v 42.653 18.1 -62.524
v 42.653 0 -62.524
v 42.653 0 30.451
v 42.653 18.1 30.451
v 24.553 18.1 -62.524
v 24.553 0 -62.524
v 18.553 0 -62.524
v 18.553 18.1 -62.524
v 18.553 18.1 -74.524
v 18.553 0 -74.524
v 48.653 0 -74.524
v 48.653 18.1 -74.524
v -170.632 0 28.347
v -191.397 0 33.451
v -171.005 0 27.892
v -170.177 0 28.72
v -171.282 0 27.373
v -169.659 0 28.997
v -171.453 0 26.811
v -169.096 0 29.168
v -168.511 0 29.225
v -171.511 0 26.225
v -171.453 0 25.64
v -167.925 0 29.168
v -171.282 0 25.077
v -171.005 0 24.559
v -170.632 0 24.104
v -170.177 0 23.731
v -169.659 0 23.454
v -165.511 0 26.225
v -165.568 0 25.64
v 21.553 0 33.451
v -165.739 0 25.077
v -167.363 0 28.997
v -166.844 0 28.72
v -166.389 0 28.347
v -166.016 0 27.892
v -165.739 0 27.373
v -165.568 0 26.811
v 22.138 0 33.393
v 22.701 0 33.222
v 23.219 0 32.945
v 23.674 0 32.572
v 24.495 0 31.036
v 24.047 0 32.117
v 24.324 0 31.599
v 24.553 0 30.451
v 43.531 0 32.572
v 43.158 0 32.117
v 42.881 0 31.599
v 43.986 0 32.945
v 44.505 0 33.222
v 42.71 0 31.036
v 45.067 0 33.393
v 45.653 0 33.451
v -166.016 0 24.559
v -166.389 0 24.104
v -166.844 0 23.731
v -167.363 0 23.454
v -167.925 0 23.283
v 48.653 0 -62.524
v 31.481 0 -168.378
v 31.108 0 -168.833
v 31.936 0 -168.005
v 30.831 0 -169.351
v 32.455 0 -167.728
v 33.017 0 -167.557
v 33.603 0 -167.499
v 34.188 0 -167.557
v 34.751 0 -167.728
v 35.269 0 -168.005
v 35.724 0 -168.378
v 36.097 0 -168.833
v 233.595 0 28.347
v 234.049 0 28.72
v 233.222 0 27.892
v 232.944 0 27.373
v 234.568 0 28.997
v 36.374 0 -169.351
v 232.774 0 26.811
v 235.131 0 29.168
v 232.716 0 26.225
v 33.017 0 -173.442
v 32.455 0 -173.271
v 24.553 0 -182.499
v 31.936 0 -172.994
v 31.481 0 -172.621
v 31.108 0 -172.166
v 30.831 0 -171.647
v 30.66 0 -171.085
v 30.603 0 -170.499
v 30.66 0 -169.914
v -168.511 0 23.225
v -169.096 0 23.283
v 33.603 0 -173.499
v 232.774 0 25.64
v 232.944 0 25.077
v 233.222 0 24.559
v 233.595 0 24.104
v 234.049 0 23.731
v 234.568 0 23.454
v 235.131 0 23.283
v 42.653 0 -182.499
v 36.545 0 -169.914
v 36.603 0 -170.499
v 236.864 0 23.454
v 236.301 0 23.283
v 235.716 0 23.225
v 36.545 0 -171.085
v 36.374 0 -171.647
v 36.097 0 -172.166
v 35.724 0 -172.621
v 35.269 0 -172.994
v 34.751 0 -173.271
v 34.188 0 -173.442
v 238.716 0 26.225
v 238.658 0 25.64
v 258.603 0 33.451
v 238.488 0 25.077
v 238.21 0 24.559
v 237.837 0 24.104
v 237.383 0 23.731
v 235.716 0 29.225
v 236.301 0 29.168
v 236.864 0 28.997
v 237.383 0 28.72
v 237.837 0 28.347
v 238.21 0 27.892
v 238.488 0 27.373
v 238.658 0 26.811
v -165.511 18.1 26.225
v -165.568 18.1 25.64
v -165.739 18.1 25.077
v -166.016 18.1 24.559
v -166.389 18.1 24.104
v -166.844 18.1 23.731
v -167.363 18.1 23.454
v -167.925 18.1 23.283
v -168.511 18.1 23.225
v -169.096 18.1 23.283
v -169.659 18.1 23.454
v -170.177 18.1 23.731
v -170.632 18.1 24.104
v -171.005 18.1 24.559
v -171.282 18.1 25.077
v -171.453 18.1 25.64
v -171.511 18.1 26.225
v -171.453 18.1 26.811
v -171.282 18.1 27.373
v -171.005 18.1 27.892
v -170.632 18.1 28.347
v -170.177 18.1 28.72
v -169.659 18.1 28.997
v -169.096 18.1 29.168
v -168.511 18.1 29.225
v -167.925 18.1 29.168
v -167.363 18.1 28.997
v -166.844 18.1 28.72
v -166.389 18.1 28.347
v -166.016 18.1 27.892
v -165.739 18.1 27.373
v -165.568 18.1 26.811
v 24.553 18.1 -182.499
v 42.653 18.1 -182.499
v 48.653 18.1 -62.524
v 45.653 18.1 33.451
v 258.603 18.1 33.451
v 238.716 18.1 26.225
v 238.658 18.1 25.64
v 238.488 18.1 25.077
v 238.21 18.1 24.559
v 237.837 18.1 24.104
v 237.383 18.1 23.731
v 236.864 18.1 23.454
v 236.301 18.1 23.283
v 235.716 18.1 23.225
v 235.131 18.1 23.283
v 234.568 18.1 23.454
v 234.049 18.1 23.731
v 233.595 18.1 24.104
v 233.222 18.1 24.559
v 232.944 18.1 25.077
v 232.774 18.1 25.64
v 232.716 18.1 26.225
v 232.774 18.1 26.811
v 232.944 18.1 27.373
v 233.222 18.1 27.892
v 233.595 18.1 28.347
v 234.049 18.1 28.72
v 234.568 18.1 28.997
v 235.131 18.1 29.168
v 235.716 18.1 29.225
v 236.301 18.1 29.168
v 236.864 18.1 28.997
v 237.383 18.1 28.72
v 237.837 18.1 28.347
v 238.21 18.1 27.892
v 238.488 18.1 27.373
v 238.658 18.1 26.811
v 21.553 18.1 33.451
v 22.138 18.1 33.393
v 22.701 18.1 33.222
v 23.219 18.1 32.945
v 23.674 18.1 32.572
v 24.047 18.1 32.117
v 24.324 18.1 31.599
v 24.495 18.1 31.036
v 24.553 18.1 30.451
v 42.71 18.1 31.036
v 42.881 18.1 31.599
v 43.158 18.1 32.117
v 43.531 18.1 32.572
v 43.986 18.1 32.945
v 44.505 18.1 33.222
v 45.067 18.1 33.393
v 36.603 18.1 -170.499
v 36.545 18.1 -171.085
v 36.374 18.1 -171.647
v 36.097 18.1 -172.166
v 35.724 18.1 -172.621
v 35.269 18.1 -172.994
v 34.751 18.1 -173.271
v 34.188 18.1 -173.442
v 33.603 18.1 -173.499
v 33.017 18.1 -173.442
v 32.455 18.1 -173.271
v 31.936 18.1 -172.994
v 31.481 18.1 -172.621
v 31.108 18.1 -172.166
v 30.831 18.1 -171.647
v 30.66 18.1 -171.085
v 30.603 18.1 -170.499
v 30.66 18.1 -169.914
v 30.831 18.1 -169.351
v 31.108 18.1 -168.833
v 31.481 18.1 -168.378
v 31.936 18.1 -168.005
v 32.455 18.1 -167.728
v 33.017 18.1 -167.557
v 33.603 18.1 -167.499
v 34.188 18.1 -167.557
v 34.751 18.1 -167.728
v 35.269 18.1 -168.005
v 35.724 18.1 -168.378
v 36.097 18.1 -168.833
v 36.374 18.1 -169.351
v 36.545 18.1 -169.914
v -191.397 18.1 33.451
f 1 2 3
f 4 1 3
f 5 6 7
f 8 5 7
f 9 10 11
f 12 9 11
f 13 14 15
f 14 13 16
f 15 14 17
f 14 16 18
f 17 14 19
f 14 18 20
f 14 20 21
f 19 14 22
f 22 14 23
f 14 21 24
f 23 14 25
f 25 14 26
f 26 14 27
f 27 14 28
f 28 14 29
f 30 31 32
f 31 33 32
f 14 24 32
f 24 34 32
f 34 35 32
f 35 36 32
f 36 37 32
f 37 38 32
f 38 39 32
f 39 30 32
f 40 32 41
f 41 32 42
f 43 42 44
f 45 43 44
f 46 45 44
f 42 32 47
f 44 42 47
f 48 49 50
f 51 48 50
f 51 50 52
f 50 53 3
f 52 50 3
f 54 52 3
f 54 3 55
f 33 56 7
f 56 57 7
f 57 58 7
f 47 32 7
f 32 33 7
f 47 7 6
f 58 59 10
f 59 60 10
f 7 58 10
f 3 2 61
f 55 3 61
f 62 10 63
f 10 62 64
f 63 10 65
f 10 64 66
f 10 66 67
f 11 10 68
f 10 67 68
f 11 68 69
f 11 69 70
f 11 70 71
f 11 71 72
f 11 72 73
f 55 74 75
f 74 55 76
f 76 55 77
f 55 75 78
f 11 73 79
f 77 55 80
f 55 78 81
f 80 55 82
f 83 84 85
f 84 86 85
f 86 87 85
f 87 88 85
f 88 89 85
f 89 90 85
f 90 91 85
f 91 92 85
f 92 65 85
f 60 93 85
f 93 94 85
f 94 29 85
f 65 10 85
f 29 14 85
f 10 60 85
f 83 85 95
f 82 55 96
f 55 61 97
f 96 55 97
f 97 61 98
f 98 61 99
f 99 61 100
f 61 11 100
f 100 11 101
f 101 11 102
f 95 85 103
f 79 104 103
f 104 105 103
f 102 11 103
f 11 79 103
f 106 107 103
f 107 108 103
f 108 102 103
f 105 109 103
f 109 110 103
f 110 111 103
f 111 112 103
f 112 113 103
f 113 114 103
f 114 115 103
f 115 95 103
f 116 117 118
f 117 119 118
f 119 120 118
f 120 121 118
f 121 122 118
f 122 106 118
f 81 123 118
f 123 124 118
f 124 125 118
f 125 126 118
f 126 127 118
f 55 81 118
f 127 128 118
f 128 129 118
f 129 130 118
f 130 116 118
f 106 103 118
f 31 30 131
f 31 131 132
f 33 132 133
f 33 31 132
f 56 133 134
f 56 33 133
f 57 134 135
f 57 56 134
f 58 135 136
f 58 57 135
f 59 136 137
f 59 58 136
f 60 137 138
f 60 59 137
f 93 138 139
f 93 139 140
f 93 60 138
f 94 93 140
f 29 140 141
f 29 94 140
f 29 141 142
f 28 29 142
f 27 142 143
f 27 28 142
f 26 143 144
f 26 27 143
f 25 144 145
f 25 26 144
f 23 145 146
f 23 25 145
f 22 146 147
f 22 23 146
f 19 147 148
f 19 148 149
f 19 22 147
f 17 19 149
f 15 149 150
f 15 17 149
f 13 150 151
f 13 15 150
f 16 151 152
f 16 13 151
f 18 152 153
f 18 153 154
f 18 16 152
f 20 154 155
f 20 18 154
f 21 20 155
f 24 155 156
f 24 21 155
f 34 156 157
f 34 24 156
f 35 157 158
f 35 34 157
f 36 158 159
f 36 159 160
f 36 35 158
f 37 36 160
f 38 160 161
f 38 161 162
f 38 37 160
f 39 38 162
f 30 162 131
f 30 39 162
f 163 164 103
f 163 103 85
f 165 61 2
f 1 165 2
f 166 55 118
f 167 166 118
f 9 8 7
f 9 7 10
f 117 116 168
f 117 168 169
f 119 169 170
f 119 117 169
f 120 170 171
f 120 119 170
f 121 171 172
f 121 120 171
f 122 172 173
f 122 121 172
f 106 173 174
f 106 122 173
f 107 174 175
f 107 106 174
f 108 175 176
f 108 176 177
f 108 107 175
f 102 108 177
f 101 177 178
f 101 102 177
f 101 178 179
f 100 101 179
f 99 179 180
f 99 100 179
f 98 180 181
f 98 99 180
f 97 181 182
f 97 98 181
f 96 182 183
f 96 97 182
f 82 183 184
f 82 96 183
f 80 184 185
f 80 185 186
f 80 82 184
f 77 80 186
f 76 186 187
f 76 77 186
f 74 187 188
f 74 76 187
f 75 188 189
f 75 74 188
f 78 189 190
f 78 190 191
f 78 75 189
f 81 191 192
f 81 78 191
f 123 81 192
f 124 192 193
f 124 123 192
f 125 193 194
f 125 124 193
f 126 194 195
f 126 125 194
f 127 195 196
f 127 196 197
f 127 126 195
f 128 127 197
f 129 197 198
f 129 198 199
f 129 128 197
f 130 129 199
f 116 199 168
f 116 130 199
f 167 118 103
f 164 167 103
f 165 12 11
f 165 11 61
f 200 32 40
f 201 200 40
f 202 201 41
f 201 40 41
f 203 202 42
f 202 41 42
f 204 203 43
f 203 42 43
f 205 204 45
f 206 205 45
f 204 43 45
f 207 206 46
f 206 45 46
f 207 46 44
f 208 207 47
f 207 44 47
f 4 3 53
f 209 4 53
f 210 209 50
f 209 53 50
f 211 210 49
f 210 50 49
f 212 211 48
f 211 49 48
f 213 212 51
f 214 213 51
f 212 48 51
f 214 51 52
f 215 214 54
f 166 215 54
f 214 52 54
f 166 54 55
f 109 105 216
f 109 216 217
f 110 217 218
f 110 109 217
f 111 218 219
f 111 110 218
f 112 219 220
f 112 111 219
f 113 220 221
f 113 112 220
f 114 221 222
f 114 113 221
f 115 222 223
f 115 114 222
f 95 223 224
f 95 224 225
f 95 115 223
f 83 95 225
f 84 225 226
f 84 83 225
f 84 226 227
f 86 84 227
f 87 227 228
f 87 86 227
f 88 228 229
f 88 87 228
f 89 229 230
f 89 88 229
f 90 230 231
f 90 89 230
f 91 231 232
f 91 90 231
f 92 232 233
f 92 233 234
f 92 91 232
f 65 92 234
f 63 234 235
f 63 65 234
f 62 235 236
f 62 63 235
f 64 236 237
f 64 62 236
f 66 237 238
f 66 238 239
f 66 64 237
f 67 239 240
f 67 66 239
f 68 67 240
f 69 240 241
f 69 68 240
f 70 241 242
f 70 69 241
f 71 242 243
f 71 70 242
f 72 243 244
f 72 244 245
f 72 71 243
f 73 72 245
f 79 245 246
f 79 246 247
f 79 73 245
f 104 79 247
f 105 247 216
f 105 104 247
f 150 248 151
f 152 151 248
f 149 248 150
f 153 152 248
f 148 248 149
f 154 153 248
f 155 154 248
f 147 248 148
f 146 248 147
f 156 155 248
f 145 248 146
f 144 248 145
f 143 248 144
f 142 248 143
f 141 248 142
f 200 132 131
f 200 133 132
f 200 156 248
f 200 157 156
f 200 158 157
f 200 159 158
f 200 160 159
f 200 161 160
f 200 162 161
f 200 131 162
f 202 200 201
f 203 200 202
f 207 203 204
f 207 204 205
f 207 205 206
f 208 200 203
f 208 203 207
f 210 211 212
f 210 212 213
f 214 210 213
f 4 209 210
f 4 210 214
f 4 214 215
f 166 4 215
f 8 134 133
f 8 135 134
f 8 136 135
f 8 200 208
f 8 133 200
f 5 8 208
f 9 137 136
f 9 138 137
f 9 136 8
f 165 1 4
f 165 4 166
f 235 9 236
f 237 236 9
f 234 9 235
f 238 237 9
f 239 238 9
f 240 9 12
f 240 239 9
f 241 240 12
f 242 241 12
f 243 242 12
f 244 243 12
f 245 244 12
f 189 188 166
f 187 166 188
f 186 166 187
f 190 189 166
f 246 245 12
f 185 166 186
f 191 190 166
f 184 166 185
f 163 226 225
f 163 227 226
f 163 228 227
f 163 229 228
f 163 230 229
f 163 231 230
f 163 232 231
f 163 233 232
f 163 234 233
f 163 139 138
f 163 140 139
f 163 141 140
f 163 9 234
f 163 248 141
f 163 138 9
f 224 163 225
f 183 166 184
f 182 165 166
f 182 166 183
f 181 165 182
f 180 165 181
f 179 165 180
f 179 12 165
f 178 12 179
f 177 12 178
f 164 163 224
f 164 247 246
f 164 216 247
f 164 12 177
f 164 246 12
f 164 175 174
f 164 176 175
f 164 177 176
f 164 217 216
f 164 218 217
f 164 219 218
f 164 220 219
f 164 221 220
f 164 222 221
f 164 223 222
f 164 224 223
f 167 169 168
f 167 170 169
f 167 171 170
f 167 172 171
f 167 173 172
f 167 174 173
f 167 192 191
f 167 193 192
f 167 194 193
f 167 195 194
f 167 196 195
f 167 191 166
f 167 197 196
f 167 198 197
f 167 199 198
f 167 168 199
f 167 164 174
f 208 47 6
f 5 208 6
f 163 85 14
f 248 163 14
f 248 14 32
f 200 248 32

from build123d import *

# Parameters (mm, degrees)
SKETCH2_R           = 3
BOSS_EXTRUDE1_DEPTH = 18.1


with BuildPart() as part:
    # Sketch2 → Boss-Extrude1 (new body)
    with BuildSketch(Plane(origin=(0, 0, 0), x_dir=(1, 0, 0), z_dir=(0, 1, 0))):
        with BuildLine():
            Line((-191.397338403, -33.450570342), (21.552661597, -33.450570342))
            ThreePointArc((21.552661597, -33.450570342), (23.673981941, -32.571890686), (24.552661597, -30.450570342))
            Line((24.552661597, -30.450570342), (24.552661597, 62.524429658))
            Line((24.552661597, 62.524429658), (18.552661597, 62.524429658))
            Line((18.552661597, 62.524429658), (18.552661597, 74.524429658))
            Line((18.552661597, 74.524429658), (24.552661597, 74.524429658))
            Line((24.552661597, 74.524429658), (42.652661597, 74.524429658))
            Line((42.652661597, 74.524429658), (48.652661597, 74.524429658))
            Line((48.652661597, 74.524429658), (48.652661597, 62.524429658))
            Line((48.652661597, 62.524429658), (42.652661597, 62.524429658))
            Line((42.652661597, 62.524429658), (42.652661597, -30.450570342))
            ThreePointArc((42.652661597, -30.450570342), (43.531341253, -32.571890686), (45.652661597, -33.450570342))
            Line((45.652661597, -33.450570342), (258.602661597, -33.450570342))
            Line((258.602661597, -33.450570342), (42.652661597, 182.499429658))
            Line((42.652661597, 182.499429658), (24.552661597, 182.499429658))
            Line((24.552661597, 182.499429658), (-191.397338403, -33.450570342))
        make_face()
        with Locations((33.602661597, 170.499429658)):
            Circle(SKETCH2_R, mode=Mode.SUBTRACT)
        with Locations((235.716045652, -26.225419091)):
            Circle(SKETCH2_R, mode=Mode.SUBTRACT)
        with Locations((-168.510722458, -26.225419091)):
            Circle(SKETCH2_R, mode=Mode.SUBTRACT)
    extrude(amount=BOSS_EXTRUDE1_DEPTH)


solid = part.part
